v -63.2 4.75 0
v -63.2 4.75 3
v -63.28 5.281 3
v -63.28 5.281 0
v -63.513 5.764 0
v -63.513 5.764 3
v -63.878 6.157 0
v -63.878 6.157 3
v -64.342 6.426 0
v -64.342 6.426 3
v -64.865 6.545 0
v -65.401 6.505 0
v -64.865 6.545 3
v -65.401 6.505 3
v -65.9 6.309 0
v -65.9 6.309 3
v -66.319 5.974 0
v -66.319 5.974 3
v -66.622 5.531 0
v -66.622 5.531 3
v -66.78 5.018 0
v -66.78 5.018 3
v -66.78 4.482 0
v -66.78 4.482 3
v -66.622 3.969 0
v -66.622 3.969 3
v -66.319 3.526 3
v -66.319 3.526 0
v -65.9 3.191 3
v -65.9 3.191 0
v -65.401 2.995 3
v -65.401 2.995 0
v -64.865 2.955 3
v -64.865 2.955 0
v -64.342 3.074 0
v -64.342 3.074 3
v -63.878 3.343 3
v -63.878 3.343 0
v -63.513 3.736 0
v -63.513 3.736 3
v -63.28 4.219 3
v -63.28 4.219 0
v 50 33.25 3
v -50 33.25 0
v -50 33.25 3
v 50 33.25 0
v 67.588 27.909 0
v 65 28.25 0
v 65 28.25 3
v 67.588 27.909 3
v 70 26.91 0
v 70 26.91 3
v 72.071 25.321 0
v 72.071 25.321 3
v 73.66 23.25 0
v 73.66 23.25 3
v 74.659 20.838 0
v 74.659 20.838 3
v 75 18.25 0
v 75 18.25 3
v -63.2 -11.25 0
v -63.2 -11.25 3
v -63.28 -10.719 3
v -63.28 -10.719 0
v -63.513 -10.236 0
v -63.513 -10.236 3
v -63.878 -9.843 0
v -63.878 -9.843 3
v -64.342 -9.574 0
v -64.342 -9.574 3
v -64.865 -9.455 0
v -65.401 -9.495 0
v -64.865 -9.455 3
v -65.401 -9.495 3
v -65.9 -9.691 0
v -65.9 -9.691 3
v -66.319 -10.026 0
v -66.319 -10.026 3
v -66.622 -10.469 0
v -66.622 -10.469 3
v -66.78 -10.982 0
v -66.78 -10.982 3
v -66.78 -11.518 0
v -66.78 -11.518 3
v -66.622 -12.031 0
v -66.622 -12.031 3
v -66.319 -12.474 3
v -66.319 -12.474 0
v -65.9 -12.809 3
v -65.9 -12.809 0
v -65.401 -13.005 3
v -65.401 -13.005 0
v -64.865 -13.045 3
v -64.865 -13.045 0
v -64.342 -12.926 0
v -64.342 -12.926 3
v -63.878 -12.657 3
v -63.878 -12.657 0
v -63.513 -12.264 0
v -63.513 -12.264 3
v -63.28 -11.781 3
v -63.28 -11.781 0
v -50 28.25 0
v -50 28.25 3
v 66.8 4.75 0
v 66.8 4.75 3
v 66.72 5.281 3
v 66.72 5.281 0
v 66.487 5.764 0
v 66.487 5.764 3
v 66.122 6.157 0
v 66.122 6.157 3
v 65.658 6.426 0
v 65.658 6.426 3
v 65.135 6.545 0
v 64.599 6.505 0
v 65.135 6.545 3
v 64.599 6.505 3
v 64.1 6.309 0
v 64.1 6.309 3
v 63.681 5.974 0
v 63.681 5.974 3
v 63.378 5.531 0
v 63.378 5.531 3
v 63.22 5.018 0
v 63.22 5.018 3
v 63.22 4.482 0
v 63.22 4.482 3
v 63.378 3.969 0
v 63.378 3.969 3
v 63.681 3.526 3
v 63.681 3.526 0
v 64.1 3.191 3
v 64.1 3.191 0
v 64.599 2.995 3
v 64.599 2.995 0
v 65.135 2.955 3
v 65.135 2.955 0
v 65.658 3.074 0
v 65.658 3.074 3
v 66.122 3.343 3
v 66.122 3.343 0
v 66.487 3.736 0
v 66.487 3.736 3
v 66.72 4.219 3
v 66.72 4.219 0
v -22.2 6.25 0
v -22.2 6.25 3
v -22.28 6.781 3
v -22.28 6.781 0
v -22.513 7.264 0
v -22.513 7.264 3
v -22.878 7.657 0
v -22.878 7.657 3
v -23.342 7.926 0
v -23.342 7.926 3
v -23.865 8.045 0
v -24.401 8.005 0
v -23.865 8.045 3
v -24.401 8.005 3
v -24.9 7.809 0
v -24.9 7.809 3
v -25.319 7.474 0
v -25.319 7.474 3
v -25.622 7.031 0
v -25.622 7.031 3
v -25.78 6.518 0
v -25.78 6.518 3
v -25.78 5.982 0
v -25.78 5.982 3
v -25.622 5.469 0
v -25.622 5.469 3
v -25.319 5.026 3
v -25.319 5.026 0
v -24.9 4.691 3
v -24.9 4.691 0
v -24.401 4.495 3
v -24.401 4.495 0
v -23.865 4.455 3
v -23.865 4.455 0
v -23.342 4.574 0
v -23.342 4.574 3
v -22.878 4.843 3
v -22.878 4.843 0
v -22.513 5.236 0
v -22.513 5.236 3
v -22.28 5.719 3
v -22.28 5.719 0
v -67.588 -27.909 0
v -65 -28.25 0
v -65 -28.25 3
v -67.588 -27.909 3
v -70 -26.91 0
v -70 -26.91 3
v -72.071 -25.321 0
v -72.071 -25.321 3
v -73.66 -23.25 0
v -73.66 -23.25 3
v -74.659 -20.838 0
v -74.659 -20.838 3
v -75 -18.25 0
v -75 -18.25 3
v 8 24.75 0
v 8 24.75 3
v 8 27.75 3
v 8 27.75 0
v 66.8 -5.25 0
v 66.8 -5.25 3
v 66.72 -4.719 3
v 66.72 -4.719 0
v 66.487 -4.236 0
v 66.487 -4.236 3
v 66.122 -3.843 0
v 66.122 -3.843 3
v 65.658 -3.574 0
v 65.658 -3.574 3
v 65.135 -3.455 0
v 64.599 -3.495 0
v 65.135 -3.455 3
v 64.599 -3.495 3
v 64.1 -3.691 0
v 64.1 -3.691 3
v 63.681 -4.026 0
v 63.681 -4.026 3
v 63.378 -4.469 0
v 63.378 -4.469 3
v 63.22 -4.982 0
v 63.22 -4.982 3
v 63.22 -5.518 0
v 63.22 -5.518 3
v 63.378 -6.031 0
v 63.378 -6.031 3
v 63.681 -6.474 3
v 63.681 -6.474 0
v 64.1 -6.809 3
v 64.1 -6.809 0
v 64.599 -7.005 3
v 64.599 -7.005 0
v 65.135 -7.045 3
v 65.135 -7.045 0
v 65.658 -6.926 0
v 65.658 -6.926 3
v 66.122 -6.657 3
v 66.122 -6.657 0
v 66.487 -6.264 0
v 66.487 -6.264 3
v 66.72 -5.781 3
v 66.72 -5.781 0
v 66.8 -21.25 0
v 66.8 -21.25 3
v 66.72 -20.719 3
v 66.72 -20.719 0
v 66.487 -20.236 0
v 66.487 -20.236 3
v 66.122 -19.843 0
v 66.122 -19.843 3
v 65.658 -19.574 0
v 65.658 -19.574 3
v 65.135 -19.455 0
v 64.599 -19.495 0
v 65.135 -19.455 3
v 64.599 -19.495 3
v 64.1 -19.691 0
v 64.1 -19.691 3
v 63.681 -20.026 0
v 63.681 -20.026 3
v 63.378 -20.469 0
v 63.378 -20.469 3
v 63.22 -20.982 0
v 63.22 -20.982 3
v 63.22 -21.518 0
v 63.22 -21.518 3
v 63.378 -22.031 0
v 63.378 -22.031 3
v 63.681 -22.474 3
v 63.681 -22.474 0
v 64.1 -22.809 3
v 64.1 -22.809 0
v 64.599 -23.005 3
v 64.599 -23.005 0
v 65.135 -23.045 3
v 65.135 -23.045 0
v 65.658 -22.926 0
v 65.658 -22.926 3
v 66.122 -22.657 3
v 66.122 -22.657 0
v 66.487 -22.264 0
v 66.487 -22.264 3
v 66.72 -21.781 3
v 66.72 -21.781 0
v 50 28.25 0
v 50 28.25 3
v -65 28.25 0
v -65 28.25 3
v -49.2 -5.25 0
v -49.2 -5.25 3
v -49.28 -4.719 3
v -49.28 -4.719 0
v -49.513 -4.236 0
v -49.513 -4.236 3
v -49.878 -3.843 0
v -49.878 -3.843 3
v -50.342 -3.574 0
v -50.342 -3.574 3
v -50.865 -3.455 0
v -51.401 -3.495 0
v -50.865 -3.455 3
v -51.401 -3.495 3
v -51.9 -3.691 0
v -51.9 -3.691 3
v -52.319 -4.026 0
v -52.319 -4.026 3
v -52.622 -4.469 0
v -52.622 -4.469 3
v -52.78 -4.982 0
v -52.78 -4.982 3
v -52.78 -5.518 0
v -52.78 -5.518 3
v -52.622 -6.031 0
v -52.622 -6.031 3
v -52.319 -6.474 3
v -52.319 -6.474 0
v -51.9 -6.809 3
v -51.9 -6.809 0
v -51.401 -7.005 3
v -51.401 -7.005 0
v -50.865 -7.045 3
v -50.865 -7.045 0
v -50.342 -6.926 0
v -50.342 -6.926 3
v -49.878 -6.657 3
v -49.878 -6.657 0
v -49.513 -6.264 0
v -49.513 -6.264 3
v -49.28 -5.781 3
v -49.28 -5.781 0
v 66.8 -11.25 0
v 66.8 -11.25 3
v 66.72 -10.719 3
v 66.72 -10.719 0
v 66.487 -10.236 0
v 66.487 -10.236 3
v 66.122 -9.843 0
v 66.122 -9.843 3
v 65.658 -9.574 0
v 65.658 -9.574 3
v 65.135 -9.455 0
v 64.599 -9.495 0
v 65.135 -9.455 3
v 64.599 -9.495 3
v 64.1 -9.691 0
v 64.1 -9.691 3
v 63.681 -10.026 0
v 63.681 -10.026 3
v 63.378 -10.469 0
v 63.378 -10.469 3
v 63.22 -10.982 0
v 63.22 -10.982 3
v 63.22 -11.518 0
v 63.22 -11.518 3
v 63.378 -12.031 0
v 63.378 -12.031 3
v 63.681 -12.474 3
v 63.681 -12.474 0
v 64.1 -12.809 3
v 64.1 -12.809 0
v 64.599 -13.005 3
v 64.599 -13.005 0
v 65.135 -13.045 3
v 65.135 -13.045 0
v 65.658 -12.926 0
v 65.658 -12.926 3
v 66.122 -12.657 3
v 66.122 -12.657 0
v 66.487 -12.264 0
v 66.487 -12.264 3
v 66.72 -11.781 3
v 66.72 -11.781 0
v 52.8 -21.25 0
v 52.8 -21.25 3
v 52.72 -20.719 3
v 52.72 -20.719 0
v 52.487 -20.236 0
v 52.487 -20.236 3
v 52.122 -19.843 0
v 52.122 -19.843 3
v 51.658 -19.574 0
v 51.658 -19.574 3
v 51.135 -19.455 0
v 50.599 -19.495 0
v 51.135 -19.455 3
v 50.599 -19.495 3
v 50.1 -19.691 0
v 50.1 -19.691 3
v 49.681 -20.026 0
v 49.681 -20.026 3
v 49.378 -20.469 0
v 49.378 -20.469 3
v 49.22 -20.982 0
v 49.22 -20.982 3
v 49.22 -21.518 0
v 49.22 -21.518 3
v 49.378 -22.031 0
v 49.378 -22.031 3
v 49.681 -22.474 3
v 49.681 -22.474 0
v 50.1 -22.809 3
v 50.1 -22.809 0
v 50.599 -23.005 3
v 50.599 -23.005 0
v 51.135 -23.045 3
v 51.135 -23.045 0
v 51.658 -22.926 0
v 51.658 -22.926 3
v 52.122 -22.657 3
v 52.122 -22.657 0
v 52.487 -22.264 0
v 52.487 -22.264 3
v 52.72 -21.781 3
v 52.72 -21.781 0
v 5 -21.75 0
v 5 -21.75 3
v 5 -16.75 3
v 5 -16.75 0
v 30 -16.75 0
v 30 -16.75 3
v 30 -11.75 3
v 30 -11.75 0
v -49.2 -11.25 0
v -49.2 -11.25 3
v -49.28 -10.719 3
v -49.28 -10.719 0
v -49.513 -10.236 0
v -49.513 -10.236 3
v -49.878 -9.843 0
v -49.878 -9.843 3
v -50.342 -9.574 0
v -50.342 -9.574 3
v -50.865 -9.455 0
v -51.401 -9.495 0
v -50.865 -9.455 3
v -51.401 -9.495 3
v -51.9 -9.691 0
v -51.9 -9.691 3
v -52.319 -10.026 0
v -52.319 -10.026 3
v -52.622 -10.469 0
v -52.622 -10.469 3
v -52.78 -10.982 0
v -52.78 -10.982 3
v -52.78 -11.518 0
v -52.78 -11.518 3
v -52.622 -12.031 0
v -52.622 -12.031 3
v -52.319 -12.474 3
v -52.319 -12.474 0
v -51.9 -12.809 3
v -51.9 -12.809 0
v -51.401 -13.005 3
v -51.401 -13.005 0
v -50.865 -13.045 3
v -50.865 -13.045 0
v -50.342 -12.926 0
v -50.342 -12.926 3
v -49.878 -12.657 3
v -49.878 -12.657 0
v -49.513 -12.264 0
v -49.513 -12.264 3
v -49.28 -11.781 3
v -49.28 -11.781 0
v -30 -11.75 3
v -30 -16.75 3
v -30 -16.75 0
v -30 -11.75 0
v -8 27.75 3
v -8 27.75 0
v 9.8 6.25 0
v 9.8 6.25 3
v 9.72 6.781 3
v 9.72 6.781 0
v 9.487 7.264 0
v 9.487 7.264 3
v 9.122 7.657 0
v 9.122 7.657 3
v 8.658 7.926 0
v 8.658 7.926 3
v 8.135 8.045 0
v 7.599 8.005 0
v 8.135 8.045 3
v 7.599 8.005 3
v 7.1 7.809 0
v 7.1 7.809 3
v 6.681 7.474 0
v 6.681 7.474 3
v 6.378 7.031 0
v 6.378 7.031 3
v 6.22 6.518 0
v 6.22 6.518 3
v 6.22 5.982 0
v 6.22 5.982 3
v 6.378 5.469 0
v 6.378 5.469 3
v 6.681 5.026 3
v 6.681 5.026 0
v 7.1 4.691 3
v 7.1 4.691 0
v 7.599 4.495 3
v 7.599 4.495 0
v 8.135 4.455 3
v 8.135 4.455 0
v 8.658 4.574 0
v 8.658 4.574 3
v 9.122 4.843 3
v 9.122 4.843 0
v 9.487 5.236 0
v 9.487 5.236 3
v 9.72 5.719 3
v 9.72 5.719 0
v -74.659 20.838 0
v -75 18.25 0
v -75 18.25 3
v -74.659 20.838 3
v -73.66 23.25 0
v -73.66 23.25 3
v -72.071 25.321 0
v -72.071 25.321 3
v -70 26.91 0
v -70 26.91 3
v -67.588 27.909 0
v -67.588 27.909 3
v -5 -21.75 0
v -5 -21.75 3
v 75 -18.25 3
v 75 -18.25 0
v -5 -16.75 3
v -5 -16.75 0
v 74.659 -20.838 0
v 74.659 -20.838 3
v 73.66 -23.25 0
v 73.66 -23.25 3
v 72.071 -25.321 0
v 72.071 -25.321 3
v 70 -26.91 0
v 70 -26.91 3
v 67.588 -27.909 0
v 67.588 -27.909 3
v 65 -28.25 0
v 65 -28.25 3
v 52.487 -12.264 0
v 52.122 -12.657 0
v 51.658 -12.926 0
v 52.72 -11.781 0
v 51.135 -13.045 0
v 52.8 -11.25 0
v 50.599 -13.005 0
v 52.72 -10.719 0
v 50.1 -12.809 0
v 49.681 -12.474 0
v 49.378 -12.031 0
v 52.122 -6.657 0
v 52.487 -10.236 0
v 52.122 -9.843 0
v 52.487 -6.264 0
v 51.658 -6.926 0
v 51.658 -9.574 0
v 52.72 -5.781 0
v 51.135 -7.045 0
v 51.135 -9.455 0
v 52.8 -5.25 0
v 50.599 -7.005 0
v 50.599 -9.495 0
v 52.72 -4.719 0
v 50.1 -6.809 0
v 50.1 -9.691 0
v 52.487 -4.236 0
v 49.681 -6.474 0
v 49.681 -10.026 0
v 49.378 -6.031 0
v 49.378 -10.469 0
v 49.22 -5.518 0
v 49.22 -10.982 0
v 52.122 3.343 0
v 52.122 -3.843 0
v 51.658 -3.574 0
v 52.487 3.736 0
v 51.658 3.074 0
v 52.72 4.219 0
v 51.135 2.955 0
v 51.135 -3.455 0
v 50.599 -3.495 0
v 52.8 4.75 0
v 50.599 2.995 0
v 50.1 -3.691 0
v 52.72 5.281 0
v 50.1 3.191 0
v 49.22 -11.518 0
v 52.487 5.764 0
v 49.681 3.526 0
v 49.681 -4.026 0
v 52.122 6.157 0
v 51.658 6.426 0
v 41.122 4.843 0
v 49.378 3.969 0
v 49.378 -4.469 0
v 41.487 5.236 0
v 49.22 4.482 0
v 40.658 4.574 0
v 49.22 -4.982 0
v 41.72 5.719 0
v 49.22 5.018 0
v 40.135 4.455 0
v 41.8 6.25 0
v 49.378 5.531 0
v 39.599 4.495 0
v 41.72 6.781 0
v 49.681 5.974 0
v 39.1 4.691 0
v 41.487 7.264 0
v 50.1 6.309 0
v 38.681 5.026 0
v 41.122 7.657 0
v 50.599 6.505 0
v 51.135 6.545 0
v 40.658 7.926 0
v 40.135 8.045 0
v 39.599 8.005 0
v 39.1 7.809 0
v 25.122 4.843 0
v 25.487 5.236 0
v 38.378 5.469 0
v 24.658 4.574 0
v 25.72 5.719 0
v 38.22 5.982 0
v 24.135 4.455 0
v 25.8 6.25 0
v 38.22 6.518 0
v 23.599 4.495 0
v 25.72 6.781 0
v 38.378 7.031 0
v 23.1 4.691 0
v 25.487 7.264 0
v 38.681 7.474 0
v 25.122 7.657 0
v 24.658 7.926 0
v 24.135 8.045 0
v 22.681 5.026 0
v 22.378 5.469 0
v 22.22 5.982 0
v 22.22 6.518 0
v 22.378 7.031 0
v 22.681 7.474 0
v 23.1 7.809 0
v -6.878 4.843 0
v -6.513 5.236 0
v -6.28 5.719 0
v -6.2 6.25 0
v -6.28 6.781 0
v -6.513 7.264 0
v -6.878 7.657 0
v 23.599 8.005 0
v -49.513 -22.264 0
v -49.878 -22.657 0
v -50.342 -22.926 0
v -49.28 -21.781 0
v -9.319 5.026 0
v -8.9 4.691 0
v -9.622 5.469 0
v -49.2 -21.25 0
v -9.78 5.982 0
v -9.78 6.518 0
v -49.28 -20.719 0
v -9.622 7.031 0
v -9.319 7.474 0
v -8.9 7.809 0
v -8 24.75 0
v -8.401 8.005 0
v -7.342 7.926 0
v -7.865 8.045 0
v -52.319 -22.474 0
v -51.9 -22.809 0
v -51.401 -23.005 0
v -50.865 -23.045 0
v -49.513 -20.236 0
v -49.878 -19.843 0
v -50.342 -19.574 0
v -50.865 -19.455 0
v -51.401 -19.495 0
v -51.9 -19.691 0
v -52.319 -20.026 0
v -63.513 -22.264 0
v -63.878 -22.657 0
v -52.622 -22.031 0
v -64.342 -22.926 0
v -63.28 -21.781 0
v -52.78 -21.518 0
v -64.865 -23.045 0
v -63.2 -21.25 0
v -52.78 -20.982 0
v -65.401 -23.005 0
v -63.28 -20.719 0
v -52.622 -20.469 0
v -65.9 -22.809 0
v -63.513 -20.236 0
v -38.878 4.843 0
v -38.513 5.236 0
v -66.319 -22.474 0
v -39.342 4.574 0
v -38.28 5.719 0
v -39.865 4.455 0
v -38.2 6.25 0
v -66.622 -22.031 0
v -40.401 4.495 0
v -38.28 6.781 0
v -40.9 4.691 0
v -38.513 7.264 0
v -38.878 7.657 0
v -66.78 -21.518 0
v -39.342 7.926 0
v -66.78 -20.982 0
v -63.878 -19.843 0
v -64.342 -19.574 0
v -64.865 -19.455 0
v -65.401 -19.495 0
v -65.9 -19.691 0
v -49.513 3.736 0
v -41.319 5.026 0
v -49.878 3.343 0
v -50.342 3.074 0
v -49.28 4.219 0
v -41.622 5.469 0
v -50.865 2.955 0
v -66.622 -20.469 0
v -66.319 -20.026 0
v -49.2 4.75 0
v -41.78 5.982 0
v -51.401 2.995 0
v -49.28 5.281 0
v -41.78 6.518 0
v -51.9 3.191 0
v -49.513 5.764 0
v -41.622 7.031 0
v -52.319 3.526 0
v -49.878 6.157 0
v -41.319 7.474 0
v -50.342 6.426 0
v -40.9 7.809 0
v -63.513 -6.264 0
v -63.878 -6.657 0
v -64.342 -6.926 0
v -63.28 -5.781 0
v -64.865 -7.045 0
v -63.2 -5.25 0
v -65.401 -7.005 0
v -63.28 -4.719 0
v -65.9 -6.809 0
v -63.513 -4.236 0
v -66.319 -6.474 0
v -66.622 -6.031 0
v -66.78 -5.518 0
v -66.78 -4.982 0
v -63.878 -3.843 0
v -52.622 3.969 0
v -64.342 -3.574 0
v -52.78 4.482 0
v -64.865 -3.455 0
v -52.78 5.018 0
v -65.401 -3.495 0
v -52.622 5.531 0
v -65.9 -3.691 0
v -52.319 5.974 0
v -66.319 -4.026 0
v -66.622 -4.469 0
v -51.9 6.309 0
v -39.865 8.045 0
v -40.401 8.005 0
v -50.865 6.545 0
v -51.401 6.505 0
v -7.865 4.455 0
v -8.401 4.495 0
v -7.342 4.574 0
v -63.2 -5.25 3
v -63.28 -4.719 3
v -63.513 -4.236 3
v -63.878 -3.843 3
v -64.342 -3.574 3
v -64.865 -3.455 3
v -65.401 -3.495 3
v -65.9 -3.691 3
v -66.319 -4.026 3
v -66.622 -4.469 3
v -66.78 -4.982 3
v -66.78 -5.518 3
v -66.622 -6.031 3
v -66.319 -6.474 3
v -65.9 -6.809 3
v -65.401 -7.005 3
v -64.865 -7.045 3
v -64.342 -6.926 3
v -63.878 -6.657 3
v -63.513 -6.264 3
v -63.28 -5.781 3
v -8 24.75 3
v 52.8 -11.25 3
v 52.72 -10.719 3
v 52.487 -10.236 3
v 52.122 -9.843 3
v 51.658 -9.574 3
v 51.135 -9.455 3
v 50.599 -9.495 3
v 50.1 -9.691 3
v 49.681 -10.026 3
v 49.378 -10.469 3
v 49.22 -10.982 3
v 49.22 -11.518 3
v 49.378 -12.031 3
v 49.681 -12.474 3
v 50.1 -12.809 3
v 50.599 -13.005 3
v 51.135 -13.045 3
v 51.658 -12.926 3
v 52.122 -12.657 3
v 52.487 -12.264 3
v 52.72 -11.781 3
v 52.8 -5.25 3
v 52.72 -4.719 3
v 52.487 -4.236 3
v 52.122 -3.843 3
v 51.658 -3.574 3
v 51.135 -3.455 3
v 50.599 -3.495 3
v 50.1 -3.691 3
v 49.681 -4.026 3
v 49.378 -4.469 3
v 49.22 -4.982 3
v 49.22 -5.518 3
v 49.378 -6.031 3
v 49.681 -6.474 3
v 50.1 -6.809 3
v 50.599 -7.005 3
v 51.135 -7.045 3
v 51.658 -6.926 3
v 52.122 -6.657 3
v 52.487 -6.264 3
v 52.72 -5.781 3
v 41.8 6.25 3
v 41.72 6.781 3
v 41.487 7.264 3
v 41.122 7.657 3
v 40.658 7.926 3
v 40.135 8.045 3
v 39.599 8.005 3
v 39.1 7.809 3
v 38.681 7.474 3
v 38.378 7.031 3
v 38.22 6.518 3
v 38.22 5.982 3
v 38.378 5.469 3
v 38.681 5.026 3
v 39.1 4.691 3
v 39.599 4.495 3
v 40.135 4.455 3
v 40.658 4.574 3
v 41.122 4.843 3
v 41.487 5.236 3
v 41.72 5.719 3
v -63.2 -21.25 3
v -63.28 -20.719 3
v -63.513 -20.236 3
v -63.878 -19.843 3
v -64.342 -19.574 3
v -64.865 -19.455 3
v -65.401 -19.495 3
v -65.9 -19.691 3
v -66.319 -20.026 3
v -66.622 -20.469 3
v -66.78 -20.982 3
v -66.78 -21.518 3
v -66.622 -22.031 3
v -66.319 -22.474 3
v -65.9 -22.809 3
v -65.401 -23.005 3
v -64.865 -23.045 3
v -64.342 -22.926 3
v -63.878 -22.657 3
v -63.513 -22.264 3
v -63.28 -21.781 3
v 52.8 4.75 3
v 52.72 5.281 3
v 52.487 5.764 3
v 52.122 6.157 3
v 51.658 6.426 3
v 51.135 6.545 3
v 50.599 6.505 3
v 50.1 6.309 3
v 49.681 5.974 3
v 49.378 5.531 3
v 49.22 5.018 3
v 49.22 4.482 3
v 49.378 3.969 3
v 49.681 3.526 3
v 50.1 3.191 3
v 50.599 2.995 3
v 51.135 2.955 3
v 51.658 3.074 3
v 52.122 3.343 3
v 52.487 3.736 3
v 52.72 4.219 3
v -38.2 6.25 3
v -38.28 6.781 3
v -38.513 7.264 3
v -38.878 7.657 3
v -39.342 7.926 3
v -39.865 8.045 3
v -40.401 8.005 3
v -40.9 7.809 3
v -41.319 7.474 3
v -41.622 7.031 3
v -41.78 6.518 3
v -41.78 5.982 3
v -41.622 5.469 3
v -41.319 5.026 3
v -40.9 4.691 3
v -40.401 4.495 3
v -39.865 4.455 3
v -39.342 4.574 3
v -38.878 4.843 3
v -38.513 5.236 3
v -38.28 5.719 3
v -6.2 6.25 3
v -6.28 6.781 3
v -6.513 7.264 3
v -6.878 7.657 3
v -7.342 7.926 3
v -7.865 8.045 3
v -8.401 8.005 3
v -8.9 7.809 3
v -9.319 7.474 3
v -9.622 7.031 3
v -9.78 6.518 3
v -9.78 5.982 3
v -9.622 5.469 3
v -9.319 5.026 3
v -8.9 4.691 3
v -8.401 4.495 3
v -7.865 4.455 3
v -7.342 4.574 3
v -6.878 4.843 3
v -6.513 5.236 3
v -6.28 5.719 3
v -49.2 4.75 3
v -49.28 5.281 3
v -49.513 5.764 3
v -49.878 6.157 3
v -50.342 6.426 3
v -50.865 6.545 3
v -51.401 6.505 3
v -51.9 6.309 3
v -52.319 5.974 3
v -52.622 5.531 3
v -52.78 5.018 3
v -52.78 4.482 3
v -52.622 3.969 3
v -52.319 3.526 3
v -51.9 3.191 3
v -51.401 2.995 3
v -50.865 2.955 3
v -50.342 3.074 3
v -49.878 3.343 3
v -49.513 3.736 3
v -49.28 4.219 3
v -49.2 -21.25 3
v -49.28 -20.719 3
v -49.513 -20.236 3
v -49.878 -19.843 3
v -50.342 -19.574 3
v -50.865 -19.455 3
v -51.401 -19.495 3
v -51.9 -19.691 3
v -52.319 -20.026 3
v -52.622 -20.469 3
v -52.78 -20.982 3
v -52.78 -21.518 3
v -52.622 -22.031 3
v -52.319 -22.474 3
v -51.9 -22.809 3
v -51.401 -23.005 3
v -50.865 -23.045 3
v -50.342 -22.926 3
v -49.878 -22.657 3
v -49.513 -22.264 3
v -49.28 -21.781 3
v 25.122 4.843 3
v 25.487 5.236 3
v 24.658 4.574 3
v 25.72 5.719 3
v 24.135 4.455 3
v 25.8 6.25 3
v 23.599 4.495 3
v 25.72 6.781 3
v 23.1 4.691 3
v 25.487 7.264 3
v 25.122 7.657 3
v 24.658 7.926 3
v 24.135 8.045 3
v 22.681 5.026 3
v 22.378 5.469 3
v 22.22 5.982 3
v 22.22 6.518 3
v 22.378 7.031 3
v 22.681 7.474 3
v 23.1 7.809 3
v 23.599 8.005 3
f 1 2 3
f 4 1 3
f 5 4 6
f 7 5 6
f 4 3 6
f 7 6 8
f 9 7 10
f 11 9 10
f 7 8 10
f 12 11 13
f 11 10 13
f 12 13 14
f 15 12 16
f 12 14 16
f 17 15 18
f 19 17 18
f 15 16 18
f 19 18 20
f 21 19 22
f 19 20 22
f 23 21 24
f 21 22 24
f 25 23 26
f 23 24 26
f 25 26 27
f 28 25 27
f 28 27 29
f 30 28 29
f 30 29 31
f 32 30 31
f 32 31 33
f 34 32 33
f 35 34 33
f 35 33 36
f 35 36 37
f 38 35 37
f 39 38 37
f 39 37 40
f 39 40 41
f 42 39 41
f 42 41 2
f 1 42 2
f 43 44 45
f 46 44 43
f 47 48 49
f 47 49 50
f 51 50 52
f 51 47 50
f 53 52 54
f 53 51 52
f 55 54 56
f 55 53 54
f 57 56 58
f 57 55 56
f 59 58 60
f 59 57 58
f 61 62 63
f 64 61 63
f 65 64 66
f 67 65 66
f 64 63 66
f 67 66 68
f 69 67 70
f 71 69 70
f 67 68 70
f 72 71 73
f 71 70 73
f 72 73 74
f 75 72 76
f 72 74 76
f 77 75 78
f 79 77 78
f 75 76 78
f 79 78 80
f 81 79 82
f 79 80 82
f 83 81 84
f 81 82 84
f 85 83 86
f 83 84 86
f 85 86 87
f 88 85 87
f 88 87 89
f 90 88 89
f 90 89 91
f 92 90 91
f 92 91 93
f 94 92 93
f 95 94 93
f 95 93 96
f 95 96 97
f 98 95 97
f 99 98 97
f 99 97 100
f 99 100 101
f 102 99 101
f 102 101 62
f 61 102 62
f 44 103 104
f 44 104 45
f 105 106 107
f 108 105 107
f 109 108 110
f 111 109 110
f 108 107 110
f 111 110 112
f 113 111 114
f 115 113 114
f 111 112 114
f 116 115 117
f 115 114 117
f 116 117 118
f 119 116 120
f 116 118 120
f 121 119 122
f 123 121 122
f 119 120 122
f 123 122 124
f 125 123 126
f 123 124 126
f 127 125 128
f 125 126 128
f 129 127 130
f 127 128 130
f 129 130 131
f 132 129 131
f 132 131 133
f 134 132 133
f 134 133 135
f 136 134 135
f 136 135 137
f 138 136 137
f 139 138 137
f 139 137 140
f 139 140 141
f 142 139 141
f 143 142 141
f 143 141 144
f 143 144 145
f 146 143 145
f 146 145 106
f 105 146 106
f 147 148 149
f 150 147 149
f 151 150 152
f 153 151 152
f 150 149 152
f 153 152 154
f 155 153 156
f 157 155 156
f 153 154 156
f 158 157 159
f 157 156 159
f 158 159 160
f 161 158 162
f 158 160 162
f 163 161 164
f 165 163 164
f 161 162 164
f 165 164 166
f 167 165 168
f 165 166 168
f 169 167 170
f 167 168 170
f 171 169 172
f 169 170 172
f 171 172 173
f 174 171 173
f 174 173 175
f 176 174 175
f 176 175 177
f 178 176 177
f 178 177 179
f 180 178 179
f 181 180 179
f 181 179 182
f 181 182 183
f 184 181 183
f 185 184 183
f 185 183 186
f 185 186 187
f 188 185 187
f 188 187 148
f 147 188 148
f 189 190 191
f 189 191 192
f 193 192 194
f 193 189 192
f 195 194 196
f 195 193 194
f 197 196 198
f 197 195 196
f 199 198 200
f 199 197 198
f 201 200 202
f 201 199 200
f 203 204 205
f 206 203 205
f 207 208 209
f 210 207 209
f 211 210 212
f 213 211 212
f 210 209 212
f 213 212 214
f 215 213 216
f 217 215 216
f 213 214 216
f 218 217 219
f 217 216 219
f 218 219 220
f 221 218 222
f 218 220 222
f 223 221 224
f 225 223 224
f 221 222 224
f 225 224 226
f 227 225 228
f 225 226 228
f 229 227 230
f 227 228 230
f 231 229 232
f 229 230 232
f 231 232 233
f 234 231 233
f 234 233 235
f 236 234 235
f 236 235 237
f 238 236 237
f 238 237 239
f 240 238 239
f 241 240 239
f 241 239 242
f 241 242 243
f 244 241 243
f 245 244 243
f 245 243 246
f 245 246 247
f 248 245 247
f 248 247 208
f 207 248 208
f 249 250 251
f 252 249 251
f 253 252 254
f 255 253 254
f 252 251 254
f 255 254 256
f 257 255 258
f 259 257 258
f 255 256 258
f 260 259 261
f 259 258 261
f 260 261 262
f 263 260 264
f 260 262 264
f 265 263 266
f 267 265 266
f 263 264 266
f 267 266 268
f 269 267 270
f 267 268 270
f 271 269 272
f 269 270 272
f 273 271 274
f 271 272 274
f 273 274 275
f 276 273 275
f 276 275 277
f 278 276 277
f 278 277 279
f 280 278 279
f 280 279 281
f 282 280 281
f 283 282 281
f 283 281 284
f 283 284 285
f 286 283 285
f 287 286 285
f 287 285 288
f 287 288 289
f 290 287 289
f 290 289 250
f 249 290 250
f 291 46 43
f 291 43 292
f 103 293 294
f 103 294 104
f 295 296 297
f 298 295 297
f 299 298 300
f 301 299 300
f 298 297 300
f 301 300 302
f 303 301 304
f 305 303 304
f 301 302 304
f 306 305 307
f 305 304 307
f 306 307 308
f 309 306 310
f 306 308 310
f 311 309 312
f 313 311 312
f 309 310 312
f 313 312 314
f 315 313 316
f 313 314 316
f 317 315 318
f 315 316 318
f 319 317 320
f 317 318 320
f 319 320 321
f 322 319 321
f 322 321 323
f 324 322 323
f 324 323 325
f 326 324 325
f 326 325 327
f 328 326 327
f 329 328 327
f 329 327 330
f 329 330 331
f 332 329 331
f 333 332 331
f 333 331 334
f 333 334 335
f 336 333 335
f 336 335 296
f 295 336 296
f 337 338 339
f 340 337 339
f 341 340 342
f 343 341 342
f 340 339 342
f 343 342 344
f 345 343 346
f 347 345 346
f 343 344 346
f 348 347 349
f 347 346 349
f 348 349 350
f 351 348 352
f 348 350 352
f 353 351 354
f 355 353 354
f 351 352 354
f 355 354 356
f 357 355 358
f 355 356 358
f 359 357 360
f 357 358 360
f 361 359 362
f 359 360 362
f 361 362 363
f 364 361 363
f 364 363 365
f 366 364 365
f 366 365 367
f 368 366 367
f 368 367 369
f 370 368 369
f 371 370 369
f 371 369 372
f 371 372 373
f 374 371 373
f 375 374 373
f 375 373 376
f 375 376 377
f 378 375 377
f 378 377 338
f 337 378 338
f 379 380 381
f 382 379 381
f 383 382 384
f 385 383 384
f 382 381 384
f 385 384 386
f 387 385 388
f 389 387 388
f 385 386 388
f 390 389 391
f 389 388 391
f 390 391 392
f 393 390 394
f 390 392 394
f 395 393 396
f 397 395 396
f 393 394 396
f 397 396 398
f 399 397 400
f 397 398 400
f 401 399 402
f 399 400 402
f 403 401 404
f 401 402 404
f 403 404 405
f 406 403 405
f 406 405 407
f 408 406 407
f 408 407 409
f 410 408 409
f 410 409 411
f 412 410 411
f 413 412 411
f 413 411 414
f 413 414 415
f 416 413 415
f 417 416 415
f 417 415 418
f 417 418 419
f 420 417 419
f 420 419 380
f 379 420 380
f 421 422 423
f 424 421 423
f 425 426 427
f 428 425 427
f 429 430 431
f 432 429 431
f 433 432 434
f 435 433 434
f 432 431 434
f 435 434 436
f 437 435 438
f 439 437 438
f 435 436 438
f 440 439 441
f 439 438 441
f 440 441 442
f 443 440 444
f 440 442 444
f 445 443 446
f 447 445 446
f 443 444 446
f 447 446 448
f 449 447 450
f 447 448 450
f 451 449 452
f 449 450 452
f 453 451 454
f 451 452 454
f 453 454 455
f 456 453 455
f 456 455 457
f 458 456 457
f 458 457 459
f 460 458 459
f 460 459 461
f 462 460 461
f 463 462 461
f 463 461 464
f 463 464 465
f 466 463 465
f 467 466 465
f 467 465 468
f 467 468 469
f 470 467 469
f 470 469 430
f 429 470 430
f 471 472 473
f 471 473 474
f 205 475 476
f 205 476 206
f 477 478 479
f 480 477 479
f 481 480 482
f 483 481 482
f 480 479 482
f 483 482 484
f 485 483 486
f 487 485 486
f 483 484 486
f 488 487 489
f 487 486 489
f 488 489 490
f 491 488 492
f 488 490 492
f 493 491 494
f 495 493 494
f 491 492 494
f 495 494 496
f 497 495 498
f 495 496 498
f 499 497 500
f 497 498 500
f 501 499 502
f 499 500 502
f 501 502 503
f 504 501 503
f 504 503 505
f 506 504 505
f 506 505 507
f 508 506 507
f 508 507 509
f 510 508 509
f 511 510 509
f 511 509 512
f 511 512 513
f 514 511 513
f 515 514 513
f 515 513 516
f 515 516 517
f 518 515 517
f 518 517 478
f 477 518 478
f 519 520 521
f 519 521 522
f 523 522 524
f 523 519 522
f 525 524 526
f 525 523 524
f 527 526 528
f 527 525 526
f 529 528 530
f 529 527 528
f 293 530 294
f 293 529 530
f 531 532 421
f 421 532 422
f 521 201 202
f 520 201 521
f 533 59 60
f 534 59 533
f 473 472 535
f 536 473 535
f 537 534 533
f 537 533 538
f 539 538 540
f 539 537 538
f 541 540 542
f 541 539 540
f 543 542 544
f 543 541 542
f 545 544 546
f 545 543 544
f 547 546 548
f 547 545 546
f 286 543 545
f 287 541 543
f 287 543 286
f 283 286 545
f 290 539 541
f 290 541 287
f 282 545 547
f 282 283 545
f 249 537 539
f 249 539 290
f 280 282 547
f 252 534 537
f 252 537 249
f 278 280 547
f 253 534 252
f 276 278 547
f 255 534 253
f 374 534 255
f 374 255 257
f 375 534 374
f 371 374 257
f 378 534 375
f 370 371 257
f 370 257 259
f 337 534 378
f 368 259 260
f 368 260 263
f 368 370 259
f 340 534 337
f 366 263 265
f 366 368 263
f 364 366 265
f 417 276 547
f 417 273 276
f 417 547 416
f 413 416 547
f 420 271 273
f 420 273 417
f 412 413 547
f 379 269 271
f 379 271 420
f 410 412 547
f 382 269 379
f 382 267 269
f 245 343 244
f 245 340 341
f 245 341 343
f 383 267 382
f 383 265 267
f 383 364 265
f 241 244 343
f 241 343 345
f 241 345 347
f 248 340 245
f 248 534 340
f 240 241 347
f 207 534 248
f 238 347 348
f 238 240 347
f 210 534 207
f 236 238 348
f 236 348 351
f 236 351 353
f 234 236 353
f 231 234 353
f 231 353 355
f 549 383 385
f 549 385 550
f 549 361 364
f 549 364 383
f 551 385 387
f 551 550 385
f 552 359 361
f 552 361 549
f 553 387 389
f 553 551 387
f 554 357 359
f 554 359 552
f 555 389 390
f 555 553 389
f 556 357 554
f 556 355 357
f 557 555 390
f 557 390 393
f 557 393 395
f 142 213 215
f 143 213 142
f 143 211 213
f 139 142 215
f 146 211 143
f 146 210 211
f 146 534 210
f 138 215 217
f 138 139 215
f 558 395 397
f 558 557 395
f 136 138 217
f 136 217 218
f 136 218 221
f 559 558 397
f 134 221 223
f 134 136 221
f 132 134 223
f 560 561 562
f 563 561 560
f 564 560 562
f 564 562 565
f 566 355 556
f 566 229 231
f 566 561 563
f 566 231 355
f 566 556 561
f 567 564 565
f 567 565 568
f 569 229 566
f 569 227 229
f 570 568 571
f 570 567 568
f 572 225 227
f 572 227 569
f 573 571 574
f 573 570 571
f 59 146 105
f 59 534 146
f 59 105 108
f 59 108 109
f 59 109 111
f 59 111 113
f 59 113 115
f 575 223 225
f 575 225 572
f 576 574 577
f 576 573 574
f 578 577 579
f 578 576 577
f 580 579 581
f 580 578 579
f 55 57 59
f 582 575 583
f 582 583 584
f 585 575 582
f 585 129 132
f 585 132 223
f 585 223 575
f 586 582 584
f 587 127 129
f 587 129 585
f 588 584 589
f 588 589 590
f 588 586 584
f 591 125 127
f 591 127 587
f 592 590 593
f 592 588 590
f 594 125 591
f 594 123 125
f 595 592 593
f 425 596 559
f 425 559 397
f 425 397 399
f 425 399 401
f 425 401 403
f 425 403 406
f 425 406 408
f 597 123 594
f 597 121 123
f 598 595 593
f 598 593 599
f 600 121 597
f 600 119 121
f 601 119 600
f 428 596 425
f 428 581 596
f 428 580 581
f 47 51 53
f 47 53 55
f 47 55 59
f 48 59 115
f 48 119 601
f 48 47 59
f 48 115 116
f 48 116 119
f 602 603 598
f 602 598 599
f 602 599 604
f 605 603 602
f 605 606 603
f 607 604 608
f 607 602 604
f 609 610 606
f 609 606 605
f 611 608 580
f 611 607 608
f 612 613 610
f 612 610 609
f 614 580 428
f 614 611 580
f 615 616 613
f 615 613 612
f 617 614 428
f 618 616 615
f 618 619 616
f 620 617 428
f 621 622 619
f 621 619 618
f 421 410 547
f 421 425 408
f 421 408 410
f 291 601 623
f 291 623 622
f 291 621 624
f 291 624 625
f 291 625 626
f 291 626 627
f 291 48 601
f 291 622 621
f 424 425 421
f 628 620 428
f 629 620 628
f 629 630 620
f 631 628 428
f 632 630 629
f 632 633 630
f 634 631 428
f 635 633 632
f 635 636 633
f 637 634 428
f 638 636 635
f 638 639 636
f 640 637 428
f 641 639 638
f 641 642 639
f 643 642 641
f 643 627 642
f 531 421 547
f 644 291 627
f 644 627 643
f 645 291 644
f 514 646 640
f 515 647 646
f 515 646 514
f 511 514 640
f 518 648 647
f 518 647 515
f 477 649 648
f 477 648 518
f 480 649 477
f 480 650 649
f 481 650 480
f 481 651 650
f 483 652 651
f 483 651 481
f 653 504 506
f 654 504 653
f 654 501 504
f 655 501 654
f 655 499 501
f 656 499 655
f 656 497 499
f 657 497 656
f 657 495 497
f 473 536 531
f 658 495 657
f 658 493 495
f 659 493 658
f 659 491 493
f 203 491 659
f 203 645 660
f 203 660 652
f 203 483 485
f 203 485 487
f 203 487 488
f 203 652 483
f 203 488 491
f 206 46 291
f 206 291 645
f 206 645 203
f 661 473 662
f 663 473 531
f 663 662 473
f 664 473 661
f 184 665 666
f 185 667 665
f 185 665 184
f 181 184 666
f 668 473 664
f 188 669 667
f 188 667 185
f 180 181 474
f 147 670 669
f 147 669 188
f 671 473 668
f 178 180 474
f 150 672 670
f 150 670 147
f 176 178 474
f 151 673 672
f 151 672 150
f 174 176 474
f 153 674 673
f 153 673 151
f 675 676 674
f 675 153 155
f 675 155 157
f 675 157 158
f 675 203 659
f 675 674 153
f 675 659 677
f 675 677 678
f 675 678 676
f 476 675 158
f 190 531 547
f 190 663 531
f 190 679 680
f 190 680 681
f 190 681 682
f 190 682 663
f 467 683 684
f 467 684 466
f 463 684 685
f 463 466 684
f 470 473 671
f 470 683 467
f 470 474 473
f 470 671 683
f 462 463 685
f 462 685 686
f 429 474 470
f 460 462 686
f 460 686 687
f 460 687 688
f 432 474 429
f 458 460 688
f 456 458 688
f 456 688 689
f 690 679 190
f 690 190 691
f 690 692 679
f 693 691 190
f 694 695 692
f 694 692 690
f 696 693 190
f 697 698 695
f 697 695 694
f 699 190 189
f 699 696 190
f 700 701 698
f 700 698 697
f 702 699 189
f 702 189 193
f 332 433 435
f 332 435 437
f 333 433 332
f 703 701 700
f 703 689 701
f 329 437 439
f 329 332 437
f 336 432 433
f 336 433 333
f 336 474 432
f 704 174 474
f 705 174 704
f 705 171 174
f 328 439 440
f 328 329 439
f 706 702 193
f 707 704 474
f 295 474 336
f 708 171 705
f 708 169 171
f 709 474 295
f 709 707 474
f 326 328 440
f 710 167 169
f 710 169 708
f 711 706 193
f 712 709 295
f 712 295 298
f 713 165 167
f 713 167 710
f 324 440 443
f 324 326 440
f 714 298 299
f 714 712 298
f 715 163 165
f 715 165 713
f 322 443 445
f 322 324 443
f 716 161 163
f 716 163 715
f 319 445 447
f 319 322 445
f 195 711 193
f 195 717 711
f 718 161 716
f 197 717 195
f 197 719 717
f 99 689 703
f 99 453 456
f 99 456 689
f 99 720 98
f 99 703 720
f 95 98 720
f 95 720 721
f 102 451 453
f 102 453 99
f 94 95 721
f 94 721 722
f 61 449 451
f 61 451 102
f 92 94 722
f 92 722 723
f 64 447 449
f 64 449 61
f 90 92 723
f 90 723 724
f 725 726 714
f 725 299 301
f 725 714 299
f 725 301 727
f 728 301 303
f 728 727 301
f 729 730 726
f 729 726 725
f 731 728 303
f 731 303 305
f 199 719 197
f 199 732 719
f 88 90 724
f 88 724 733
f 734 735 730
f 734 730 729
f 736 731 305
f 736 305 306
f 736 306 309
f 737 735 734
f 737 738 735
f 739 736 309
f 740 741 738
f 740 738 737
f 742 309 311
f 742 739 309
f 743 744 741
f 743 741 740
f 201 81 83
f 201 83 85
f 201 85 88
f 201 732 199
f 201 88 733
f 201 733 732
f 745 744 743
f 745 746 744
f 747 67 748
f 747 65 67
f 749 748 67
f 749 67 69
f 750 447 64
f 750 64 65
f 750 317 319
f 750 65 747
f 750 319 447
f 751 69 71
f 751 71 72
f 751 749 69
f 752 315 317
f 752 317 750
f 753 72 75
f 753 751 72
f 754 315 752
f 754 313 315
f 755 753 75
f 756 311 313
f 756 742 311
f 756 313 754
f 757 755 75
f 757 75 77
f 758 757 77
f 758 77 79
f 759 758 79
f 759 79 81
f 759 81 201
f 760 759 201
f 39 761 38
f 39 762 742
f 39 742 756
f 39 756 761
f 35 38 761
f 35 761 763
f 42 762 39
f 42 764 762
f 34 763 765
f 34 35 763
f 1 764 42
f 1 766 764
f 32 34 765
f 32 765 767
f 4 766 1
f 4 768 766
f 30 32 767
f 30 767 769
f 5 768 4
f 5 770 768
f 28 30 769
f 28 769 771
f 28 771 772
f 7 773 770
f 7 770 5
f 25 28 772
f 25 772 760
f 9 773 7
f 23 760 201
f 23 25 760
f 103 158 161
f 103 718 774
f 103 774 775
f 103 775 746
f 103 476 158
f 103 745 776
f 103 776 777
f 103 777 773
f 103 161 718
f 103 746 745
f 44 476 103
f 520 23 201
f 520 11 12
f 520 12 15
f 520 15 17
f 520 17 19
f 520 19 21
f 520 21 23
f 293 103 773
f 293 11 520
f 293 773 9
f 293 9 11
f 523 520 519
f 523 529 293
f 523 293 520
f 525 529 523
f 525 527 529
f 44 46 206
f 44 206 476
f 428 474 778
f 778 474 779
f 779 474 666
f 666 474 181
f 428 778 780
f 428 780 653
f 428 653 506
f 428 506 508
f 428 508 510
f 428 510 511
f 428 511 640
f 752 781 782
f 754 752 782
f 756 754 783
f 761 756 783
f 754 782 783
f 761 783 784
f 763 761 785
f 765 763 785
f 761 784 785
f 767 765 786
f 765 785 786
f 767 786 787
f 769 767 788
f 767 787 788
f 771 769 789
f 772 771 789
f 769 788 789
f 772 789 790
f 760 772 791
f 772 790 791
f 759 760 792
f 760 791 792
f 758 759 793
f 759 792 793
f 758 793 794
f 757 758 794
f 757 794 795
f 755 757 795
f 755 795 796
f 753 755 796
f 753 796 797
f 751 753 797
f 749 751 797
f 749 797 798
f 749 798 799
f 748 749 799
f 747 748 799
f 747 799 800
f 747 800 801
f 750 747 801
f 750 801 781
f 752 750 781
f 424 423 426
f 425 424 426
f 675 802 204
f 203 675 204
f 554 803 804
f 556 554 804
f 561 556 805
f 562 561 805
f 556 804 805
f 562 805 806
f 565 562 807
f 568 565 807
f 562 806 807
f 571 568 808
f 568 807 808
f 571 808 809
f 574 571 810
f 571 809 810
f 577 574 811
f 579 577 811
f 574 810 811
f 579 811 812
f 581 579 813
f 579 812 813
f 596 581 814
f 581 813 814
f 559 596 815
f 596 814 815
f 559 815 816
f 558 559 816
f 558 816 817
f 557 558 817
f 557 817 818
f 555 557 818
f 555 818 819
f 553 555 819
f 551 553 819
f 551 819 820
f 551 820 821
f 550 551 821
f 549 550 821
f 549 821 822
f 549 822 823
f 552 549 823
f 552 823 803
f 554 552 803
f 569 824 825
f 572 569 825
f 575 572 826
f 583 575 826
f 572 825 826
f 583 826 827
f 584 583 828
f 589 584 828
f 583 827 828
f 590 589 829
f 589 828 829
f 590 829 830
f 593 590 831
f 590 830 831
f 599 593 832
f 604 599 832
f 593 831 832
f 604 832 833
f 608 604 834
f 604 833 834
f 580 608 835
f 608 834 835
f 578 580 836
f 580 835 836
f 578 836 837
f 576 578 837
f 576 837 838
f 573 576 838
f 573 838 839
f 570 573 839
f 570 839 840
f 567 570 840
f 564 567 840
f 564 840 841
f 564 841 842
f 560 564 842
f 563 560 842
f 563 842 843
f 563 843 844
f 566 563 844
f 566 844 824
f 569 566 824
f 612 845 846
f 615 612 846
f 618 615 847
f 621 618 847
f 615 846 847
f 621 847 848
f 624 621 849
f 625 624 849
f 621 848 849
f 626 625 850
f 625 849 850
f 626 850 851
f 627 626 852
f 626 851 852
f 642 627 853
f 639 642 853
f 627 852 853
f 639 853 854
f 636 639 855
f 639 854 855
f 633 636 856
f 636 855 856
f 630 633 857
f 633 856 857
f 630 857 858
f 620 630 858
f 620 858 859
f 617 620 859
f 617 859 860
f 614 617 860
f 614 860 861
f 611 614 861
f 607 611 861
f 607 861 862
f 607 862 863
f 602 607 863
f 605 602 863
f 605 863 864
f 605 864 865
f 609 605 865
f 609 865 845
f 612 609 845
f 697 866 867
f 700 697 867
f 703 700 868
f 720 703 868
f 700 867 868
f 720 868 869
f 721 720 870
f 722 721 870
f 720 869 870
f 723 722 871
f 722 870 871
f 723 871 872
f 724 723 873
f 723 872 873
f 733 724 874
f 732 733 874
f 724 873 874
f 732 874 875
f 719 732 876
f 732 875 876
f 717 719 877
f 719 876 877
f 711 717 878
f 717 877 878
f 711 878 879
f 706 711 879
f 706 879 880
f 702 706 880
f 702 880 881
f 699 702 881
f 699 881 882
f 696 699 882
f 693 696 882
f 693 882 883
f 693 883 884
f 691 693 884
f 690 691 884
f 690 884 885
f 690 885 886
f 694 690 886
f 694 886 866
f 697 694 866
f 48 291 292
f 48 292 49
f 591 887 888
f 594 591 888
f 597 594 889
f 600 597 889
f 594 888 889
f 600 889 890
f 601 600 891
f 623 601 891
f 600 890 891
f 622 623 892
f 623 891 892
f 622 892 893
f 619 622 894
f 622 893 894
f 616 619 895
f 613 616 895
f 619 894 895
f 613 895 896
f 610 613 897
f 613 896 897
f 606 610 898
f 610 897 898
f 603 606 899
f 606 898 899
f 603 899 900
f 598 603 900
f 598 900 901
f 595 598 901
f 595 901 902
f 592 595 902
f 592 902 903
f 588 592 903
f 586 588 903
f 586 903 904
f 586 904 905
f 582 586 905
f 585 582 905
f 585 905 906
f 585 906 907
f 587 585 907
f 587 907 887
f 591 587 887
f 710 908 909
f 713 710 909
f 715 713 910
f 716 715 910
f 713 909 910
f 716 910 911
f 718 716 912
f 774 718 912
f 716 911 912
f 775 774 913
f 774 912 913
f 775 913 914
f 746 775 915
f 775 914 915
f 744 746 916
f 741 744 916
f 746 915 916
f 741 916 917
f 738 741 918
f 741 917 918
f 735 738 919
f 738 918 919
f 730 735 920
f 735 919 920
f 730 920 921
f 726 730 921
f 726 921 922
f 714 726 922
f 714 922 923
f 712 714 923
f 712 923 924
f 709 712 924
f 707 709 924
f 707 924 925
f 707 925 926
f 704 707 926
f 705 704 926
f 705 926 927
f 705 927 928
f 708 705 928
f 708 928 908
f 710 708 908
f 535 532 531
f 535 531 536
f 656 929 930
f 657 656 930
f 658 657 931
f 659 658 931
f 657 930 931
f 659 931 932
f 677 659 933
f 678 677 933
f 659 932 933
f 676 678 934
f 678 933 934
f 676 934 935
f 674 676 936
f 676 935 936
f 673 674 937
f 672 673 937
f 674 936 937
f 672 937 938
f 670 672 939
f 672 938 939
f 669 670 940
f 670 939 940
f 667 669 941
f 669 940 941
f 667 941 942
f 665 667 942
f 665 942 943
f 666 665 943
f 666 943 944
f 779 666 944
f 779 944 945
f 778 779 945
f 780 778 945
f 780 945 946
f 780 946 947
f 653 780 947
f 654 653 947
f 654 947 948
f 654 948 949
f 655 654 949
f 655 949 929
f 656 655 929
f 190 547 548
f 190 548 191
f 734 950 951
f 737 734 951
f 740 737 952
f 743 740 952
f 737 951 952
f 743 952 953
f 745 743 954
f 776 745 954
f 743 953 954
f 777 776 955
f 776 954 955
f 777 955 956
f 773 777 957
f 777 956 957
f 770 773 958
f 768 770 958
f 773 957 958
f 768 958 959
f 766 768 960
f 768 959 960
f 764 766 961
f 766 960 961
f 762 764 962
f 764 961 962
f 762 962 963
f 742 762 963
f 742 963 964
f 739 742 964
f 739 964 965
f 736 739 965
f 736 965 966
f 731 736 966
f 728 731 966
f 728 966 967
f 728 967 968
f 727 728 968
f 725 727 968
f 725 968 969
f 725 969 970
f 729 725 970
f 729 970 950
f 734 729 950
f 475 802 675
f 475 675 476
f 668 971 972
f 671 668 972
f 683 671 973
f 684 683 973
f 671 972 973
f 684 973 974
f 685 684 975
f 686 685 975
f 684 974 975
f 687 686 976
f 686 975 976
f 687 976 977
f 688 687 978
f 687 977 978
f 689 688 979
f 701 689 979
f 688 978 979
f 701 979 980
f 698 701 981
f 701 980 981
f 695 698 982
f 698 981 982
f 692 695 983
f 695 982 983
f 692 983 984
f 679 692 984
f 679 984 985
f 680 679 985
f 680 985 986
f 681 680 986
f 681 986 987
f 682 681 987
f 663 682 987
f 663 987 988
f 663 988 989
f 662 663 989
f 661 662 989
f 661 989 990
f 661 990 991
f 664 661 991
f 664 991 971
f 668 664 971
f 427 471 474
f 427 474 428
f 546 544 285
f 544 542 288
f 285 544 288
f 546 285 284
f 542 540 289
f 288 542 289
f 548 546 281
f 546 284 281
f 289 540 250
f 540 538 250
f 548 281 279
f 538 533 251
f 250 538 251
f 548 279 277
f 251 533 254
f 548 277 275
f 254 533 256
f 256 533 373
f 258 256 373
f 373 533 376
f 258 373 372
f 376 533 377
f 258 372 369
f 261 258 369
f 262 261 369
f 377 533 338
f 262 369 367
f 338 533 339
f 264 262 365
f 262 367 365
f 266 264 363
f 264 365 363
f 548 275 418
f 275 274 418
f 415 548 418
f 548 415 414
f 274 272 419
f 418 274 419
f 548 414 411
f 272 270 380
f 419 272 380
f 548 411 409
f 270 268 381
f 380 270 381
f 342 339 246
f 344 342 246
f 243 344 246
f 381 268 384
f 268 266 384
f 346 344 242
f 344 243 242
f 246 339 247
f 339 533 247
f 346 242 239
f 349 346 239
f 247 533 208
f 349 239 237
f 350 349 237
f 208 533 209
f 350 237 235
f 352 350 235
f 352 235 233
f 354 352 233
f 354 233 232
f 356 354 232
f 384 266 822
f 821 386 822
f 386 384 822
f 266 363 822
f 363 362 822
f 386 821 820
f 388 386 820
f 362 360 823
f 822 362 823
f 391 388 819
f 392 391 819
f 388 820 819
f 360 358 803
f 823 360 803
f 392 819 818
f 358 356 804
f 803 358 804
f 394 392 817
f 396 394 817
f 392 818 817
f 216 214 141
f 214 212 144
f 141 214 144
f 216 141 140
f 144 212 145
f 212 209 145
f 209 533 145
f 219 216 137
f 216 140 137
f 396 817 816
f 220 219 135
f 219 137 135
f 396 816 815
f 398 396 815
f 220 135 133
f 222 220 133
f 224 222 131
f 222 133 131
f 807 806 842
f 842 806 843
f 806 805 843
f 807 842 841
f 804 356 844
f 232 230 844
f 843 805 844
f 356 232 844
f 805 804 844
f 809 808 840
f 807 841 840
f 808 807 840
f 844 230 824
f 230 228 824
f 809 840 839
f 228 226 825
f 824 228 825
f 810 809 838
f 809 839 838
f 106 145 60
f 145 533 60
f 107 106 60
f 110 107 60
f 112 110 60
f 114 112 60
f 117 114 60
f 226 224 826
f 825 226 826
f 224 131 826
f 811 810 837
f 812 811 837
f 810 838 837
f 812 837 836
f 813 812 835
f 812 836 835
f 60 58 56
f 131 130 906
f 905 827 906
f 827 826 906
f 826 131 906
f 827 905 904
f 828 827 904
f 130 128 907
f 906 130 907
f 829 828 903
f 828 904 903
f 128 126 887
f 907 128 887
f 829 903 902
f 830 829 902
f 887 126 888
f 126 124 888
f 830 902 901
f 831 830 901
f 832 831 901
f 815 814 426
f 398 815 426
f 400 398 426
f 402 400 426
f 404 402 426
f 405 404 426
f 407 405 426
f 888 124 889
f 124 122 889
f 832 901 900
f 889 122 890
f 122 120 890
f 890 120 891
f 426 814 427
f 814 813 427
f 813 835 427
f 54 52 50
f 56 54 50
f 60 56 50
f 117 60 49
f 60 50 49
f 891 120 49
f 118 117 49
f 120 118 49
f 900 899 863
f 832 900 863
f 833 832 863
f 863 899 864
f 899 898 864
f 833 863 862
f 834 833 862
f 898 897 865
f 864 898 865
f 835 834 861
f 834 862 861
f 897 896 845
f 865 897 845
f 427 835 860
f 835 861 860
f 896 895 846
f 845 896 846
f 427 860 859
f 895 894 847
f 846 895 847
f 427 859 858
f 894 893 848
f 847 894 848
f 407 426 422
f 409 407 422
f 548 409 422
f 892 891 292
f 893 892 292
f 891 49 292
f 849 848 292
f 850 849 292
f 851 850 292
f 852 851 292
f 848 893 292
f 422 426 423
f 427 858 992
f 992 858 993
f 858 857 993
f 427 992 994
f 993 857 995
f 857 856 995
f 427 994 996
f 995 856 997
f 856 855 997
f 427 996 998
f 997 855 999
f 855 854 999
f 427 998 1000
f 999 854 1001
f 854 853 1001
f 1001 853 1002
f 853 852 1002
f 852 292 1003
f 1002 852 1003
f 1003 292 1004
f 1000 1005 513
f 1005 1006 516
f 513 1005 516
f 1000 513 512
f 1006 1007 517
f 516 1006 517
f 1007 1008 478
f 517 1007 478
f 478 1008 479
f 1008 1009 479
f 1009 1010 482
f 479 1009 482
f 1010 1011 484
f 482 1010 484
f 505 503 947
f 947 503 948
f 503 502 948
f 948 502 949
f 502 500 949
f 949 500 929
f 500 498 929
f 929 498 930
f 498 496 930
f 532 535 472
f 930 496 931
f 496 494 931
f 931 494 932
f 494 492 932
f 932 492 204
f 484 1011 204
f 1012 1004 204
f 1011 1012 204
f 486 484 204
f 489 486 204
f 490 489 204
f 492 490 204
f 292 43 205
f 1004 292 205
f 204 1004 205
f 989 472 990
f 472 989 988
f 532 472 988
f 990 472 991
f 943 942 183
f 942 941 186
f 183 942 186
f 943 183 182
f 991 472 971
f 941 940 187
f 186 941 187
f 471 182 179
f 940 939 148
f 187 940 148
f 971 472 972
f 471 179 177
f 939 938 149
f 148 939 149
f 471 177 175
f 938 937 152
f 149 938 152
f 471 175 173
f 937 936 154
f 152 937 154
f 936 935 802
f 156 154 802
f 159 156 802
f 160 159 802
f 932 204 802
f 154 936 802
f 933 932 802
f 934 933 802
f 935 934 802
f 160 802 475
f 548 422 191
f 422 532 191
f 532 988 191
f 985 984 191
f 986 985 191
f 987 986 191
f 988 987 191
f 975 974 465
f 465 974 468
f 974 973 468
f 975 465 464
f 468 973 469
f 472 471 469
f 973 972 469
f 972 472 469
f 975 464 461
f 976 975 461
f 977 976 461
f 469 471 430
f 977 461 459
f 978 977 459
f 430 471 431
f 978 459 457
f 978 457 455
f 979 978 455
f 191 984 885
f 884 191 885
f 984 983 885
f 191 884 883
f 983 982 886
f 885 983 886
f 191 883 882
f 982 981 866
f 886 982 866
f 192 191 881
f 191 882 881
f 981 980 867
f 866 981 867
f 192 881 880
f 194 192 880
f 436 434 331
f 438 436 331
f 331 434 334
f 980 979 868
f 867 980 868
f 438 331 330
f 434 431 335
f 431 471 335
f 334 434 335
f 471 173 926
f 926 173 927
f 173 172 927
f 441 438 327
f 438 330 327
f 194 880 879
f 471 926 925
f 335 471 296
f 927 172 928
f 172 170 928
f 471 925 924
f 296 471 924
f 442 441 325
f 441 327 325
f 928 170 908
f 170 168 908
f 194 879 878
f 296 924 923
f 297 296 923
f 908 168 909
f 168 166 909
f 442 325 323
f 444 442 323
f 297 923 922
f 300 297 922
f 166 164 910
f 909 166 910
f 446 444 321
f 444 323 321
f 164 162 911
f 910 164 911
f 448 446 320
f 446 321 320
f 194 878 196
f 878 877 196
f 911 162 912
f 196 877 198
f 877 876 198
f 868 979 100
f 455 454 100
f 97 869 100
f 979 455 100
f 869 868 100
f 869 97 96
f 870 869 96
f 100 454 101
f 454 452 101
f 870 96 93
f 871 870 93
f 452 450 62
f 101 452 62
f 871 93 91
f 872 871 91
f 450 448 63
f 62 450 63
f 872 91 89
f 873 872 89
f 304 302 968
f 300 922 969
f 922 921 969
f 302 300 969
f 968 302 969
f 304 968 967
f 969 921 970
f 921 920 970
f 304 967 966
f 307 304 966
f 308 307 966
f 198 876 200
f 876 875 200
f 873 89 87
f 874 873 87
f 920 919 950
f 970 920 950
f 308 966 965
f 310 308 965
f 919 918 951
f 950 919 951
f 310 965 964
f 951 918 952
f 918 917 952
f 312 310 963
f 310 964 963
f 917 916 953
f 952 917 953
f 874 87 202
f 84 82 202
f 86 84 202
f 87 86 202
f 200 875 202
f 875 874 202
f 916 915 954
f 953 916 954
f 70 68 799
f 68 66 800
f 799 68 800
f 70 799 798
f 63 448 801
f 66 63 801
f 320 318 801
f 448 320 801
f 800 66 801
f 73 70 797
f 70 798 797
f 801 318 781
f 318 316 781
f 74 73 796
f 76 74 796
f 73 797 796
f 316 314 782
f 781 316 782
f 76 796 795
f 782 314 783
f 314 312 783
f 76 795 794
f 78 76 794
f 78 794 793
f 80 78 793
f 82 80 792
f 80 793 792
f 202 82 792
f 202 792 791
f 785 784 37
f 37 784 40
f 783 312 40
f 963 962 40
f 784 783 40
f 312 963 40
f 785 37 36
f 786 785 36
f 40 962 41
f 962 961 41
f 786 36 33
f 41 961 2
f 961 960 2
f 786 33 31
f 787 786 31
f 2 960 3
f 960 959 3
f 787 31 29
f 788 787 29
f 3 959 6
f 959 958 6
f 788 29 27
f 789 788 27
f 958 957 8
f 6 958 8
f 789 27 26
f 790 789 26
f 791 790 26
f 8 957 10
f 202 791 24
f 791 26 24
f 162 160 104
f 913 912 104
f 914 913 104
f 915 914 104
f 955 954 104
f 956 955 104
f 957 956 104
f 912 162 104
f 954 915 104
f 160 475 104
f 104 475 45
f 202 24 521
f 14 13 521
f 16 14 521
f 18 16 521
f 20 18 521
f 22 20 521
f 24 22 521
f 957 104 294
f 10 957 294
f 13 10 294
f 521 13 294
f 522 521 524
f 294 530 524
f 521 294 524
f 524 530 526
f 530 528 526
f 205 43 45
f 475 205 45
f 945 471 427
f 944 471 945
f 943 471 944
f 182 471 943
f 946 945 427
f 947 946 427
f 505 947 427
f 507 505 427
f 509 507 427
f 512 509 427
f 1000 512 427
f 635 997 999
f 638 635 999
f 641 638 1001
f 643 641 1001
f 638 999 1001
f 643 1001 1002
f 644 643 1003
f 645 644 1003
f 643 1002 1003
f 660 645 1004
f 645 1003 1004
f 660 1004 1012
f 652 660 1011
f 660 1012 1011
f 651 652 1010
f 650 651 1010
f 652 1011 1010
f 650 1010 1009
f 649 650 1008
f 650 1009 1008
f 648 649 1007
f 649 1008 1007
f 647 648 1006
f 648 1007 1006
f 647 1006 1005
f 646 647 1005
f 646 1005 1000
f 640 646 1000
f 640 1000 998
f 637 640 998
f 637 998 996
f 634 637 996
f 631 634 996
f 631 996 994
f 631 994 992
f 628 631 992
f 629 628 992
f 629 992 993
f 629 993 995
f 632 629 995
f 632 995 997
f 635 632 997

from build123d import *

# Parameters (mm, degrees)
BOSS_EXTRUDE1_DEPTH = 3
SKETCH2_R           = 1.8
SKETCH2_W           = 60
SKETCH2_H           = 5
SKETCH2_W_2         = 16
SKETCH2_H_2         = 3
CUT_EXTRUDE1_DEPTH  = 5
SKETCH3_W           = 10
SKETCH3_H           = 5
CUT_EXTRUDE2_DEPTH  = 10


with BuildPart() as part:
    # Sketch1 → Boss-Extrude1 (new body)
    with BuildSketch(Plane.XY):
        with BuildLine():
            Line((-65, 28.25), (-50, 28.25))
            Line((-50, 28.25), (-50, 33.25))
            Line((-50, 33.25), (50, 33.25))
            Line((50, 33.25), (50, 28.25))
            Line((50, 28.25), (65, 28.25))
            ThreePointArc((65, 28.25), (72.071067812, 25.321067812), (75, 18.25))
            Line((75, 18.25), (75, -18.25))
            ThreePointArc((75, -18.25), (72.071067812, -25.321067812), (65, -28.25))
            Line((65, -28.25), (-65, -28.25))
            ThreePointArc((-65, -28.25), (-72.071067812, -25.321067812), (-75, -18.25))
            Line((-75, -18.25), (-75, 18.25))
            ThreePointArc((-75, 18.25), (-72.071067812, 25.321067812), (-65, 28.25))
        make_face()
    extrude(amount=BOSS_EXTRUDE1_DEPTH)

    # Sketch2 → Cut-Extrude1 (cut)
    with BuildSketch(Plane.XY.offset(3)):
        with Locations((-65, -21.25)):
            Circle(SKETCH2_R)
        with Locations((-65, -11.25)):
            Circle(SKETCH2_R)
        with Locations((-65, -5.25)):
            Circle(SKETCH2_R)
        with Locations((-51, -5.25)):
            Circle(SKETCH2_R)
        with Locations((-51, -11.25)):
            Circle(SKETCH2_R)
        with Locations((-51, -21.25)):
            Circle(SKETCH2_R)
        with Locations((51, -5.25)):
            Circle(SKETCH2_R)
        with Locations((51, -11.25)):
            Circle(SKETCH2_R)
        with Locations((51, -21.25)):
            Circle(SKETCH2_R)
        with Locations((65, -21.25)):
            Circle(SKETCH2_R)
        with Locations((65, -11.25)):
            Circle(SKETCH2_R)
        with Locations((65, -5.25)):
            Circle(SKETCH2_R)
        with Locations((-65, 4.75)):
            Circle(SKETCH2_R)
        with Locations((-51, 4.75)):
            Circle(SKETCH2_R)
        with Locations((65, 4.75)):
            Circle(SKETCH2_R)
        with Locations((51, 4.75)):
            Circle(SKETCH2_R)
        with Locations((24, 6.25)):
            Circle(SKETCH2_R)
        with Locations((40, 6.25)):
            Circle(SKETCH2_R)
        with Locations((-40, 6.25)):
            Circle(SKETCH2_R)
        with Locations((-24, 6.25)):
            Circle(SKETCH2_R)
        with Locations((8, 6.25)):
            Circle(SKETCH2_R)
        with Locations((-8, 6.25)):
            Circle(SKETCH2_R)
        with Locations((0, -14.25)):
            Rectangle(SKETCH2_W, SKETCH2_H)
        with Locations((0, 26.25)):
            Rectangle(SKETCH2_W_2, SKETCH2_H_2)
    extrude(amount=-CUT_EXTRUDE1_DEPTH, mode=Mode.SUBTRACT)

    # Sketch3 → Cut-Extrude2 (cut)
    with BuildSketch(Plane.XY.offset(3)):
        with Locations((0, -19.25)):
            Rectangle(SKETCH3_W, SKETCH3_H)
    extrude(amount=-CUT_EXTRUDE2_DEPTH, mode=Mode.SUBTRACT)


solid = part.part
